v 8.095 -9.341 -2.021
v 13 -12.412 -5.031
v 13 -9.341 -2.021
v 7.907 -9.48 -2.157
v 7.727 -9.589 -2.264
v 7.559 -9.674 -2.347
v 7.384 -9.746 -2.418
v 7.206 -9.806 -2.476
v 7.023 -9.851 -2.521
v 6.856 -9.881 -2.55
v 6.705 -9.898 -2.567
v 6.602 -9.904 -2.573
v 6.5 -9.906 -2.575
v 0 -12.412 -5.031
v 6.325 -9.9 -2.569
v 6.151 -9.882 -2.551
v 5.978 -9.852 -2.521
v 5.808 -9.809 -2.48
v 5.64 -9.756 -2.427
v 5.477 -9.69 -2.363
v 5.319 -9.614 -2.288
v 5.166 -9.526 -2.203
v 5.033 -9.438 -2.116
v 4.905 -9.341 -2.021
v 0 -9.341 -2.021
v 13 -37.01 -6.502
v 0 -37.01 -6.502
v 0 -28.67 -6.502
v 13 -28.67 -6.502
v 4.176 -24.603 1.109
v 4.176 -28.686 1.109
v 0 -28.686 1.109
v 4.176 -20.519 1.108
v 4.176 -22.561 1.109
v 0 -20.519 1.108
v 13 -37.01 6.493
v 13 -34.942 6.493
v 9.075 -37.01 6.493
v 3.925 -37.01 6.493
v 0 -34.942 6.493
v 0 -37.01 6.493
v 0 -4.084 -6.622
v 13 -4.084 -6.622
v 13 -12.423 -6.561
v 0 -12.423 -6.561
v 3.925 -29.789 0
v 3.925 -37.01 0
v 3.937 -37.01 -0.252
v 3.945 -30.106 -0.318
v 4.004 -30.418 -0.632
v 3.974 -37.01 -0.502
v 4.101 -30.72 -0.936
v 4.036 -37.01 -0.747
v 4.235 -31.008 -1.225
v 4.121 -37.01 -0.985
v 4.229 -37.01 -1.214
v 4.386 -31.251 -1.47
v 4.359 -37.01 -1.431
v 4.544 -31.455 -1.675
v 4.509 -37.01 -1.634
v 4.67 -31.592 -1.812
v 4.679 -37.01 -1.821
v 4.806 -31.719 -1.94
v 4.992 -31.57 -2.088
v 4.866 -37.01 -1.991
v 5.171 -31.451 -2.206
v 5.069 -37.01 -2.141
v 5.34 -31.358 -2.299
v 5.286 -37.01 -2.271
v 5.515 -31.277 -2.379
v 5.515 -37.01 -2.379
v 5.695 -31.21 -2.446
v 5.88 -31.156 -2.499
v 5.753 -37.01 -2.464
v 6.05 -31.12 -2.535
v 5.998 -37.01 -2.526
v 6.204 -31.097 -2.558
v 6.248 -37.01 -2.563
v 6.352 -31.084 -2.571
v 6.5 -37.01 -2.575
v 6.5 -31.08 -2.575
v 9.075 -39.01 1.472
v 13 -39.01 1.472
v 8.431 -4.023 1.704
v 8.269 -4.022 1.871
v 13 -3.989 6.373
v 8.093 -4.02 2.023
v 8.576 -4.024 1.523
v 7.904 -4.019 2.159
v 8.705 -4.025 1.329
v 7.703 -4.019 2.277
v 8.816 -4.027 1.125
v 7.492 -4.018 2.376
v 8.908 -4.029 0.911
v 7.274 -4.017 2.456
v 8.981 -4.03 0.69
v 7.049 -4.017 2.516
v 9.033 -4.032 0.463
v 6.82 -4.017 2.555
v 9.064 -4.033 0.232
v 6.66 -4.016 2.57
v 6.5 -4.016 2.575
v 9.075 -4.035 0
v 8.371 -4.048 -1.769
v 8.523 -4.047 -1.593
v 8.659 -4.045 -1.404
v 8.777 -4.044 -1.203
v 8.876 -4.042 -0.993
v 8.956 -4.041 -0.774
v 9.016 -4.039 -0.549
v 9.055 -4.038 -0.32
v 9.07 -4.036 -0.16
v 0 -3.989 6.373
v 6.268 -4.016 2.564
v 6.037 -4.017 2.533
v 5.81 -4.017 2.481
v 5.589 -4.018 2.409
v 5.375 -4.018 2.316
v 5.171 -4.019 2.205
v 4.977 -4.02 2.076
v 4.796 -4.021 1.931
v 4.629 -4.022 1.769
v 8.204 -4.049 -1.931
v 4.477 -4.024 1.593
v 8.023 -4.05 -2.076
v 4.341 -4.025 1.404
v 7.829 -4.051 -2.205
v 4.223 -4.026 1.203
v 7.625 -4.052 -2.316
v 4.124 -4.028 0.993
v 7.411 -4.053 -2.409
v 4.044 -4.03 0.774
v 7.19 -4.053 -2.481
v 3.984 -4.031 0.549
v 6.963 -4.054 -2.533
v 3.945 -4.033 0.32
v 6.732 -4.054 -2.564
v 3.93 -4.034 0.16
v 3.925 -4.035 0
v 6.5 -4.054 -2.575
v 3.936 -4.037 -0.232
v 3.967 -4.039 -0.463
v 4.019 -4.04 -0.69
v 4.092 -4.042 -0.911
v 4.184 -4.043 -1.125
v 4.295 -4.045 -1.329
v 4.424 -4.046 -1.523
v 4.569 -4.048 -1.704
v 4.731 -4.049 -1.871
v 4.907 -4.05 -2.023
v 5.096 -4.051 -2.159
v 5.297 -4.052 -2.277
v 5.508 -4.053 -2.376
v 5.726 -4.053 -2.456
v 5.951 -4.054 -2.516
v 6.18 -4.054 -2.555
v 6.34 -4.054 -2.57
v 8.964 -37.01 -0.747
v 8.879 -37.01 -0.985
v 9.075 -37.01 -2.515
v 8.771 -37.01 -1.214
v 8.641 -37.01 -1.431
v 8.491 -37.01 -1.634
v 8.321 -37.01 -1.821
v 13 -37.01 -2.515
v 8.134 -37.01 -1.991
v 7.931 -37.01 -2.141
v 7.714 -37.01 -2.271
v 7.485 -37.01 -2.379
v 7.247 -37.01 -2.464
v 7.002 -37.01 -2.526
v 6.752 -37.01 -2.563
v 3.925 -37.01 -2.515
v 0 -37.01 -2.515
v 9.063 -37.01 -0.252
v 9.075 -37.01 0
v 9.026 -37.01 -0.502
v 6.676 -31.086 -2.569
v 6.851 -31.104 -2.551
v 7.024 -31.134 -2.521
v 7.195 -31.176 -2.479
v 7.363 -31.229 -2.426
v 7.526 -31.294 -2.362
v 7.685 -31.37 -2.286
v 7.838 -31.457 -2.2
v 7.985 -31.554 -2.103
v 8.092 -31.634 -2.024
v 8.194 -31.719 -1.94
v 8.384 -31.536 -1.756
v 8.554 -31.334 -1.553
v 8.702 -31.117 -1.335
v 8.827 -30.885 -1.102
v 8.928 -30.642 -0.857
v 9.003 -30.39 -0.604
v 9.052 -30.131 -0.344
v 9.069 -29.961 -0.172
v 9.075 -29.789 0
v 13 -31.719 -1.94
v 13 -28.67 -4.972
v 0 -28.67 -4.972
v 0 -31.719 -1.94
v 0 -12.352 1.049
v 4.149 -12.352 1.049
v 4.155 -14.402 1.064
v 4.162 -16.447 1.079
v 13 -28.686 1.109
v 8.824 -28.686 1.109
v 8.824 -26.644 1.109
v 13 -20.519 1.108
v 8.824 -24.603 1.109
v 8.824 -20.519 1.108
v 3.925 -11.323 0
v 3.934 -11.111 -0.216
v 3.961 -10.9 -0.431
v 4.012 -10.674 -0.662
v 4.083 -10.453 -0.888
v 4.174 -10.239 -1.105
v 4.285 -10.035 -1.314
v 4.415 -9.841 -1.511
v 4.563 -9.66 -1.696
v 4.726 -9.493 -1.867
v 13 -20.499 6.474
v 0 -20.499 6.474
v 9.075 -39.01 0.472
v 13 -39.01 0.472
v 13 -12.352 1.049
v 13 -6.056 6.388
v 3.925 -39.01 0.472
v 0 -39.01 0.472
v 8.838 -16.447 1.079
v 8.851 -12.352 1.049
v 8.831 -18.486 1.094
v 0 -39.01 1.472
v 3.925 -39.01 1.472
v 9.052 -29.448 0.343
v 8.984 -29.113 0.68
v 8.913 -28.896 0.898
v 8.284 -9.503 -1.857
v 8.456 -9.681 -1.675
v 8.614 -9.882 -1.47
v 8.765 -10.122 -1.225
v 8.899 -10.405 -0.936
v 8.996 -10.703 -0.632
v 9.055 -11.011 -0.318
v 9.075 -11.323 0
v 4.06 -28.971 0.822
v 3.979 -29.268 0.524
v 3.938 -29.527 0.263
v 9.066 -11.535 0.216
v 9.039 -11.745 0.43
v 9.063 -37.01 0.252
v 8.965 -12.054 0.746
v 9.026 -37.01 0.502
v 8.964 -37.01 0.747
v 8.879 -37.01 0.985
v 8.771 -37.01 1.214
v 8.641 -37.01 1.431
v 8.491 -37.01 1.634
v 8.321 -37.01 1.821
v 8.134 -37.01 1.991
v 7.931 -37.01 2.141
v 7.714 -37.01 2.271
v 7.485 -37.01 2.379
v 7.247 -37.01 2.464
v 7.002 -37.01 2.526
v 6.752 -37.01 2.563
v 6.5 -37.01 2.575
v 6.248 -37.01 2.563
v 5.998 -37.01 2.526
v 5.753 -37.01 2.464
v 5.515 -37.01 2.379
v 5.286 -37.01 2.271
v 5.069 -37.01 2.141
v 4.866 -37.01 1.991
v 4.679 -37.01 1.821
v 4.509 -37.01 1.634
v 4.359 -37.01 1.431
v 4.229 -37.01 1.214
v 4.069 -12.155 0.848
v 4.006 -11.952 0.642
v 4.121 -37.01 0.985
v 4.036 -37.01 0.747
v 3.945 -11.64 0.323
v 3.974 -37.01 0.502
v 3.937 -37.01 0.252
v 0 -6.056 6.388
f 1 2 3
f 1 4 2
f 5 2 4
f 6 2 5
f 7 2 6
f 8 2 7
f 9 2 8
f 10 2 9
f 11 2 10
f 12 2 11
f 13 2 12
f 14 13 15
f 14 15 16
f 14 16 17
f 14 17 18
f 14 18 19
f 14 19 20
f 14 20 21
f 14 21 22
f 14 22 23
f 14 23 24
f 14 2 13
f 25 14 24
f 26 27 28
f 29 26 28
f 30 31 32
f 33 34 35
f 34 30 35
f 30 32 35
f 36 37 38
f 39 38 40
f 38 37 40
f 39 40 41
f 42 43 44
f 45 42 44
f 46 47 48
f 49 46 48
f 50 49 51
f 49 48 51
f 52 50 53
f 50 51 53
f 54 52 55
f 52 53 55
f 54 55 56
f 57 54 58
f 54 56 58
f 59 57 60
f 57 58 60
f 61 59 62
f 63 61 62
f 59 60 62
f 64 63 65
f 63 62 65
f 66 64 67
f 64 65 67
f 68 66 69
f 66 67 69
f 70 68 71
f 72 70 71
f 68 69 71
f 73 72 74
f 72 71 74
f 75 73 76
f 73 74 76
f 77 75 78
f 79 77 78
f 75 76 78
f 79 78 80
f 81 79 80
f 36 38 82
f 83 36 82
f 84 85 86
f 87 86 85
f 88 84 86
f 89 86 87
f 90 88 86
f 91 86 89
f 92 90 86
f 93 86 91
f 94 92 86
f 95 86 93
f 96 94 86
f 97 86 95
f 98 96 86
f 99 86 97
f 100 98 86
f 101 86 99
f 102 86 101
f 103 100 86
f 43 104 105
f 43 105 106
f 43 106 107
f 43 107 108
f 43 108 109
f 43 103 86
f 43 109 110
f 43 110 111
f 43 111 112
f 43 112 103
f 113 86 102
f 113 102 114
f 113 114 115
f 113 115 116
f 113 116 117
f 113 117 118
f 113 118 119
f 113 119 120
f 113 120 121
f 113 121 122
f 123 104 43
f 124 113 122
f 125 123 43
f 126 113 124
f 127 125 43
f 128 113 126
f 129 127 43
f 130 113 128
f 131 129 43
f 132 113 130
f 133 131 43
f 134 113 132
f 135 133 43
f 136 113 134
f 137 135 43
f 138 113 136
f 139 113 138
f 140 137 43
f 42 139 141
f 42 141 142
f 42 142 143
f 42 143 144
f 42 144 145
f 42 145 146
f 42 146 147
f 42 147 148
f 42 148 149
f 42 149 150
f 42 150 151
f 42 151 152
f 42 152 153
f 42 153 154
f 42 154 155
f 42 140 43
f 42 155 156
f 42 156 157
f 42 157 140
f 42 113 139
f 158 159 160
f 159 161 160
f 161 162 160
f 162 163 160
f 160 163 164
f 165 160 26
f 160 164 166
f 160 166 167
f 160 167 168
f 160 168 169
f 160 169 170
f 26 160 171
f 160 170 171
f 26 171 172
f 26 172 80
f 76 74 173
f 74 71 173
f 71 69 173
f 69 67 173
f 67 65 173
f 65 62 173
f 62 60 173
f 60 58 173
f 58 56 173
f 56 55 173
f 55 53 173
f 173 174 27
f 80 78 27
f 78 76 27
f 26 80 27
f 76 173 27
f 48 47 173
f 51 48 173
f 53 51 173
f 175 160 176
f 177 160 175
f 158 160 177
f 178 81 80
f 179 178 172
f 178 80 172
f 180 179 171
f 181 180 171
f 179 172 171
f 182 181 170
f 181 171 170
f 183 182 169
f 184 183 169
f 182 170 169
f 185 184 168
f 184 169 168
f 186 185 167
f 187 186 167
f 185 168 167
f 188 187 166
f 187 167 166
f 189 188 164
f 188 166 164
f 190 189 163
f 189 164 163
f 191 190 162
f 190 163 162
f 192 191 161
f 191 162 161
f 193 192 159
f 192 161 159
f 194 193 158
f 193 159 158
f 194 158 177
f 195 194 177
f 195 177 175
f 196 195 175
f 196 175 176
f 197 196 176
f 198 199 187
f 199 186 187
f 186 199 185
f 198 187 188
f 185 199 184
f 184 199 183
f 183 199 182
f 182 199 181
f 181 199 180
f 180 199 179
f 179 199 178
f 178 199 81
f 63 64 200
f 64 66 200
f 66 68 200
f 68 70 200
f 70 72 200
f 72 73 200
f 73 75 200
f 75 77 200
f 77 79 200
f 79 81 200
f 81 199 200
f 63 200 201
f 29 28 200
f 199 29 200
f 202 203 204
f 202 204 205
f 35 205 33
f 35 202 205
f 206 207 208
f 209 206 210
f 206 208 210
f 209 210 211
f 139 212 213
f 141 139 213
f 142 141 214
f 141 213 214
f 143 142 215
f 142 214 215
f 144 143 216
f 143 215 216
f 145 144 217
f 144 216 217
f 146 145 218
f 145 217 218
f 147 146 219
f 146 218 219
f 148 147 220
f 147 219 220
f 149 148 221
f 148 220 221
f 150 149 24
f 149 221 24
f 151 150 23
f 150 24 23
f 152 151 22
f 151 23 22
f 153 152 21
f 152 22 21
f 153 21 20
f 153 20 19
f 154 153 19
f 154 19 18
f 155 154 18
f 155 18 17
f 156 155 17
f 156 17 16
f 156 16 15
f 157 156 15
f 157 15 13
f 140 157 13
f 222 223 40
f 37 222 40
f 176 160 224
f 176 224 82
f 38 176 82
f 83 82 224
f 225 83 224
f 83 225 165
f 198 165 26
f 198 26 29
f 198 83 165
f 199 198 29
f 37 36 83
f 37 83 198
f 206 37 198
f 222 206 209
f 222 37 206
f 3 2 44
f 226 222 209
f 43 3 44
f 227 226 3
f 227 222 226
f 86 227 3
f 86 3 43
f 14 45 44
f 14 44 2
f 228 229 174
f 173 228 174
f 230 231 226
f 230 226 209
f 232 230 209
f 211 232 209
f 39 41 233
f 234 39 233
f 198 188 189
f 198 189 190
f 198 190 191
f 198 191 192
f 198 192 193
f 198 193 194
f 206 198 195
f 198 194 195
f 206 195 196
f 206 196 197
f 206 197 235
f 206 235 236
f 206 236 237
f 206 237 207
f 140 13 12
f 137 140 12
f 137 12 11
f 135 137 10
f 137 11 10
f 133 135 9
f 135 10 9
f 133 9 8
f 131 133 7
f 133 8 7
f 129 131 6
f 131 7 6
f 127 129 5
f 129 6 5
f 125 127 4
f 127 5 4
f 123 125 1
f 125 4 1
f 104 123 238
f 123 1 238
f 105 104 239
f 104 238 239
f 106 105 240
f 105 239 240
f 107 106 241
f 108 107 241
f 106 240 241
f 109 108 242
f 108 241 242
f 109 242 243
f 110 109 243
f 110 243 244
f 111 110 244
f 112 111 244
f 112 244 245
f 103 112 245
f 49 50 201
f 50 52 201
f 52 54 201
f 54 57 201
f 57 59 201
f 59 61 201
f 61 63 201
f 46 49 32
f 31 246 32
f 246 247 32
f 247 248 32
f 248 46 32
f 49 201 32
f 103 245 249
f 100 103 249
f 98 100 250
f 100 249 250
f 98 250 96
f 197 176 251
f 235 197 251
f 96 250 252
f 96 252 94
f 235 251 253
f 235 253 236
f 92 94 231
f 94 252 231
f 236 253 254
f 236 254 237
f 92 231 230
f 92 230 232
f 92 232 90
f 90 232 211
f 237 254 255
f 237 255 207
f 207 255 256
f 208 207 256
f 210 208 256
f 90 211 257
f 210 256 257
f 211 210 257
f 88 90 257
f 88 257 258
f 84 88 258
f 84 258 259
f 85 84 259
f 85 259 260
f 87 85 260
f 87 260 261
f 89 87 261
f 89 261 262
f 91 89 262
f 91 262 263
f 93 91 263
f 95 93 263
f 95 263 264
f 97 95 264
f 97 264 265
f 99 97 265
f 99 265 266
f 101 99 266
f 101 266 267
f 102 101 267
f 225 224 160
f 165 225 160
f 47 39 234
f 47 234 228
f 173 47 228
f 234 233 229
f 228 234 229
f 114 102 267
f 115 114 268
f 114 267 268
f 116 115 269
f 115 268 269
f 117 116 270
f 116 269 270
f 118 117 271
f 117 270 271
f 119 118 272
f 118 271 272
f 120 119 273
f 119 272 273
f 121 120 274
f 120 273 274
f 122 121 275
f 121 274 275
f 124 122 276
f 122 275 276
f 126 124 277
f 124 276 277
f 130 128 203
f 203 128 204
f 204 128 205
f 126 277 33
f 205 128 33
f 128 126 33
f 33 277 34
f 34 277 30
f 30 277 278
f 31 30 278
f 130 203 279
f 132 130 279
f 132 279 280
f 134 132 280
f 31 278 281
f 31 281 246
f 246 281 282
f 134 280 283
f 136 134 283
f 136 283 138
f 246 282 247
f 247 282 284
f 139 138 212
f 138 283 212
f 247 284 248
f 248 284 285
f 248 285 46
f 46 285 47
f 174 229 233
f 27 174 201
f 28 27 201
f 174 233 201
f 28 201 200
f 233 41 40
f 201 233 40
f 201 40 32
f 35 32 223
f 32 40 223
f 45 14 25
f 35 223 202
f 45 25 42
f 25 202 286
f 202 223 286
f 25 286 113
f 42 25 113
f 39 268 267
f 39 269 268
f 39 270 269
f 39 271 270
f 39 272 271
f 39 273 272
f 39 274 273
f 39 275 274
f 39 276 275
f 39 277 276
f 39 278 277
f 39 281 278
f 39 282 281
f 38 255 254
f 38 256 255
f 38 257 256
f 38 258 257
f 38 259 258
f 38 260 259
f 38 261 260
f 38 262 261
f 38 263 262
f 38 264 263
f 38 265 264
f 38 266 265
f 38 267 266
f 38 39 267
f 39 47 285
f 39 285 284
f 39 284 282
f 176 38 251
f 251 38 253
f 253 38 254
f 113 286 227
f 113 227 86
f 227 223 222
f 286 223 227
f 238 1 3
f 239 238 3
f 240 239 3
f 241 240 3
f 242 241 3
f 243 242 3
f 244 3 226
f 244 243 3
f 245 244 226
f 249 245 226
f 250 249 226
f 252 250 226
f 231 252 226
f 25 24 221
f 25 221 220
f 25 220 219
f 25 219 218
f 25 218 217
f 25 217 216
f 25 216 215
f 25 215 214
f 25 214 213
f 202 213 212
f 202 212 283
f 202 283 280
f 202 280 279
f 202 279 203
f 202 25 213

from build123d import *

# Parameters (mm, degrees)
F1_DEPTH = 13
F4_DEPTH = 34.5
F5_DEPTH = 13
F6_DEPTH = 15.6
F7_DEPTH = 5.01


with BuildPart() as f1:
    # F0 (on Right) → F1 (new body)
    with BuildSketch(Plane.YZ):
        Polygon((-37.0099544525, -6.5021011516), (-28.6699544525, -6.5021011516), (-28.6699544525, -4.9721011516), (-31.7186098982, -1.9396598952), (-28.6861686418, 1.1089955505), (-20.5187435475, 1.1084489664), (-20.4991411365, 6.4742991461), (-34.9424730613, 6.4934650898), (-37.0099544525, 1.4721968726), (-37.0099544525, -2.5149521395), align=None)
        Polygon((-37.0099544525, 6.4934650898), (-37.0099544525, 1.4721968726), (-34.9424730613, 6.4934650898), align=None)
    extrude(amount=F1_DEPTH)

    # F3: F1 across face


with BuildPart() as f1_1:
    add(f1.part)
    add(f1.part.mirror(Plane(origin=(6.5, -20.508942342, 3.7913740563), x_dir=(-1, 0, 0), z_dir=(0, 0.9999933272, -0.0036531546))))

    # F2 (on face) → F4 (cut)
    with BuildSketch(Plane.XZ.offset(37.0099544525)):
        with BuildLine():
            ThreePointArc((9.075, 0), (8.3207999616, 1.8207999616), (6.5, 2.575))
            Line((6.5, 2.575), (6.5, 0))
            Line((6.5, 0), (9.075, 0))
        make_face()
        with BuildLine():
            ThreePointArc((6.5, 2.575), (4.6792000384, 1.8207999616), (3.925, 0))
            Line((3.925, 0), (6.5, 0))
            Line((6.5, 0), (6.5, 2.575))
        make_face()
        with BuildLine():
            Line((6.5, 0), (3.925, 0))
            ThreePointArc((3.925, 0), (4.6792000384, -1.8207999616), (6.5, -2.575))
            Line((6.5, -2.575), (6.5, 0))
        make_face()
        with BuildLine():
            Line((6.5, 0), (6.5, -2.575))
            ThreePointArc((6.5, -2.575), (8.3207999616, -1.8207999616), (9.075, 0))
            Line((9.075, 0), (6.5, 0))
        make_face()
    extrude(amount=-F4_DEPTH, mode=Mode.SUBTRACT)

    # F0 (on Right) → F5 (join)
    with BuildSketch(Plane.YZ):
        Polygon((-39.0099544525, 0.4721968726), (-37.0099544525, -2.5149521395), (-37.0099544525, 1.4721968726), (-39.0099544525, 1.4721968726), align=None)
        Polygon((-39.0099544525, 1.4721968726), (-37.0099544525, 1.4721968726), (-37.0099544525, 6.4934650898), align=None)
    extrude(amount=F5_DEPTH)

    # F2 (on face) → F6 (cut)
    with BuildSketch(Plane.XZ.offset(37.0099544525)):
        with BuildLine():
            ThreePointArc((9.075, 0), (8.3207999616, 1.8207999616), (6.5, 2.575))
            Line((6.5, 2.575), (6.5, 0))
            Line((6.5, 0), (9.075, 0))
        make_face()
        with BuildLine():
            ThreePointArc((6.5, 2.575), (4.6792000384, 1.8207999616), (3.925, 0))
            Line((3.925, 0), (6.5, 0))
            Line((6.5, 0), (6.5, 2.575))
        make_face()
        with BuildLine():
            Line((6.5, 0), (3.925, 0))
            ThreePointArc((3.925, 0), (4.6792000384, -1.8207999616), (6.5, -2.575))
            Line((6.5, -2.575), (6.5, 0))
        make_face()
        with BuildLine():
            Line((6.5, 0), (6.5, -2.575))
            ThreePointArc((6.5, -2.575), (8.3207999616, -1.8207999616), (9.075, 0))
            Line((9.075, 0), (6.5, 0))
        make_face()
    extrude(amount=F6_DEPTH, mode=Mode.SUBTRACT)

    # F2 (on face) → F7 (cut)
    with BuildSketch(Plane.XZ.offset(37.0099544525)):
        with BuildLine():
            Line((6.5, 6.4934650898), (3.925, 6.4934650898))
            Line((3.925, 6.4934650898), (3.925, 0))
            ThreePointArc((3.925, 0), (4.6792000384, 1.8207999616), (6.5, 2.575))
            Line((6.5, 2.575), (6.5, 6.4934650898))
        make_face()
        with BuildLine():
            Line((9.075, 6.4934650898), (6.5, 6.4934650898))
            Line((6.5, 6.4934650898), (6.5, 2.575))
            ThreePointArc((6.5, 2.575), (8.3207999616, 1.8207999616), (9.075, 0))
            Line((9.075, 0), (9.075, 6.4934650898))
        make_face()
        with BuildLine():
            ThreePointArc((9.075, 0), (8.3207999616, -1.8207999616), (6.5, -2.575))
            Line((6.5, -2.575), (6.5, -6.5021011516))
            Line((6.5, -6.5021011516), (9.075, -6.5021011516))
            Line((9.075, -6.5021011516), (9.075, 0))
        make_face()
        with BuildLine():
            ThreePointArc((6.5, -2.575), (4.6792000384, -1.8207999616), (3.925, 0))
            Line((3.925, 0), (3.925, -6.5021011516))
            Line((3.925, -6.5021011516), (6.5, -6.5021011516))
            Line((6.5, -6.5021011516), (6.5, -2.575))
        make_face()
    extrude(amount=F7_DEPTH, mode=Mode.SUBTRACT)


solid = f1_1.part
